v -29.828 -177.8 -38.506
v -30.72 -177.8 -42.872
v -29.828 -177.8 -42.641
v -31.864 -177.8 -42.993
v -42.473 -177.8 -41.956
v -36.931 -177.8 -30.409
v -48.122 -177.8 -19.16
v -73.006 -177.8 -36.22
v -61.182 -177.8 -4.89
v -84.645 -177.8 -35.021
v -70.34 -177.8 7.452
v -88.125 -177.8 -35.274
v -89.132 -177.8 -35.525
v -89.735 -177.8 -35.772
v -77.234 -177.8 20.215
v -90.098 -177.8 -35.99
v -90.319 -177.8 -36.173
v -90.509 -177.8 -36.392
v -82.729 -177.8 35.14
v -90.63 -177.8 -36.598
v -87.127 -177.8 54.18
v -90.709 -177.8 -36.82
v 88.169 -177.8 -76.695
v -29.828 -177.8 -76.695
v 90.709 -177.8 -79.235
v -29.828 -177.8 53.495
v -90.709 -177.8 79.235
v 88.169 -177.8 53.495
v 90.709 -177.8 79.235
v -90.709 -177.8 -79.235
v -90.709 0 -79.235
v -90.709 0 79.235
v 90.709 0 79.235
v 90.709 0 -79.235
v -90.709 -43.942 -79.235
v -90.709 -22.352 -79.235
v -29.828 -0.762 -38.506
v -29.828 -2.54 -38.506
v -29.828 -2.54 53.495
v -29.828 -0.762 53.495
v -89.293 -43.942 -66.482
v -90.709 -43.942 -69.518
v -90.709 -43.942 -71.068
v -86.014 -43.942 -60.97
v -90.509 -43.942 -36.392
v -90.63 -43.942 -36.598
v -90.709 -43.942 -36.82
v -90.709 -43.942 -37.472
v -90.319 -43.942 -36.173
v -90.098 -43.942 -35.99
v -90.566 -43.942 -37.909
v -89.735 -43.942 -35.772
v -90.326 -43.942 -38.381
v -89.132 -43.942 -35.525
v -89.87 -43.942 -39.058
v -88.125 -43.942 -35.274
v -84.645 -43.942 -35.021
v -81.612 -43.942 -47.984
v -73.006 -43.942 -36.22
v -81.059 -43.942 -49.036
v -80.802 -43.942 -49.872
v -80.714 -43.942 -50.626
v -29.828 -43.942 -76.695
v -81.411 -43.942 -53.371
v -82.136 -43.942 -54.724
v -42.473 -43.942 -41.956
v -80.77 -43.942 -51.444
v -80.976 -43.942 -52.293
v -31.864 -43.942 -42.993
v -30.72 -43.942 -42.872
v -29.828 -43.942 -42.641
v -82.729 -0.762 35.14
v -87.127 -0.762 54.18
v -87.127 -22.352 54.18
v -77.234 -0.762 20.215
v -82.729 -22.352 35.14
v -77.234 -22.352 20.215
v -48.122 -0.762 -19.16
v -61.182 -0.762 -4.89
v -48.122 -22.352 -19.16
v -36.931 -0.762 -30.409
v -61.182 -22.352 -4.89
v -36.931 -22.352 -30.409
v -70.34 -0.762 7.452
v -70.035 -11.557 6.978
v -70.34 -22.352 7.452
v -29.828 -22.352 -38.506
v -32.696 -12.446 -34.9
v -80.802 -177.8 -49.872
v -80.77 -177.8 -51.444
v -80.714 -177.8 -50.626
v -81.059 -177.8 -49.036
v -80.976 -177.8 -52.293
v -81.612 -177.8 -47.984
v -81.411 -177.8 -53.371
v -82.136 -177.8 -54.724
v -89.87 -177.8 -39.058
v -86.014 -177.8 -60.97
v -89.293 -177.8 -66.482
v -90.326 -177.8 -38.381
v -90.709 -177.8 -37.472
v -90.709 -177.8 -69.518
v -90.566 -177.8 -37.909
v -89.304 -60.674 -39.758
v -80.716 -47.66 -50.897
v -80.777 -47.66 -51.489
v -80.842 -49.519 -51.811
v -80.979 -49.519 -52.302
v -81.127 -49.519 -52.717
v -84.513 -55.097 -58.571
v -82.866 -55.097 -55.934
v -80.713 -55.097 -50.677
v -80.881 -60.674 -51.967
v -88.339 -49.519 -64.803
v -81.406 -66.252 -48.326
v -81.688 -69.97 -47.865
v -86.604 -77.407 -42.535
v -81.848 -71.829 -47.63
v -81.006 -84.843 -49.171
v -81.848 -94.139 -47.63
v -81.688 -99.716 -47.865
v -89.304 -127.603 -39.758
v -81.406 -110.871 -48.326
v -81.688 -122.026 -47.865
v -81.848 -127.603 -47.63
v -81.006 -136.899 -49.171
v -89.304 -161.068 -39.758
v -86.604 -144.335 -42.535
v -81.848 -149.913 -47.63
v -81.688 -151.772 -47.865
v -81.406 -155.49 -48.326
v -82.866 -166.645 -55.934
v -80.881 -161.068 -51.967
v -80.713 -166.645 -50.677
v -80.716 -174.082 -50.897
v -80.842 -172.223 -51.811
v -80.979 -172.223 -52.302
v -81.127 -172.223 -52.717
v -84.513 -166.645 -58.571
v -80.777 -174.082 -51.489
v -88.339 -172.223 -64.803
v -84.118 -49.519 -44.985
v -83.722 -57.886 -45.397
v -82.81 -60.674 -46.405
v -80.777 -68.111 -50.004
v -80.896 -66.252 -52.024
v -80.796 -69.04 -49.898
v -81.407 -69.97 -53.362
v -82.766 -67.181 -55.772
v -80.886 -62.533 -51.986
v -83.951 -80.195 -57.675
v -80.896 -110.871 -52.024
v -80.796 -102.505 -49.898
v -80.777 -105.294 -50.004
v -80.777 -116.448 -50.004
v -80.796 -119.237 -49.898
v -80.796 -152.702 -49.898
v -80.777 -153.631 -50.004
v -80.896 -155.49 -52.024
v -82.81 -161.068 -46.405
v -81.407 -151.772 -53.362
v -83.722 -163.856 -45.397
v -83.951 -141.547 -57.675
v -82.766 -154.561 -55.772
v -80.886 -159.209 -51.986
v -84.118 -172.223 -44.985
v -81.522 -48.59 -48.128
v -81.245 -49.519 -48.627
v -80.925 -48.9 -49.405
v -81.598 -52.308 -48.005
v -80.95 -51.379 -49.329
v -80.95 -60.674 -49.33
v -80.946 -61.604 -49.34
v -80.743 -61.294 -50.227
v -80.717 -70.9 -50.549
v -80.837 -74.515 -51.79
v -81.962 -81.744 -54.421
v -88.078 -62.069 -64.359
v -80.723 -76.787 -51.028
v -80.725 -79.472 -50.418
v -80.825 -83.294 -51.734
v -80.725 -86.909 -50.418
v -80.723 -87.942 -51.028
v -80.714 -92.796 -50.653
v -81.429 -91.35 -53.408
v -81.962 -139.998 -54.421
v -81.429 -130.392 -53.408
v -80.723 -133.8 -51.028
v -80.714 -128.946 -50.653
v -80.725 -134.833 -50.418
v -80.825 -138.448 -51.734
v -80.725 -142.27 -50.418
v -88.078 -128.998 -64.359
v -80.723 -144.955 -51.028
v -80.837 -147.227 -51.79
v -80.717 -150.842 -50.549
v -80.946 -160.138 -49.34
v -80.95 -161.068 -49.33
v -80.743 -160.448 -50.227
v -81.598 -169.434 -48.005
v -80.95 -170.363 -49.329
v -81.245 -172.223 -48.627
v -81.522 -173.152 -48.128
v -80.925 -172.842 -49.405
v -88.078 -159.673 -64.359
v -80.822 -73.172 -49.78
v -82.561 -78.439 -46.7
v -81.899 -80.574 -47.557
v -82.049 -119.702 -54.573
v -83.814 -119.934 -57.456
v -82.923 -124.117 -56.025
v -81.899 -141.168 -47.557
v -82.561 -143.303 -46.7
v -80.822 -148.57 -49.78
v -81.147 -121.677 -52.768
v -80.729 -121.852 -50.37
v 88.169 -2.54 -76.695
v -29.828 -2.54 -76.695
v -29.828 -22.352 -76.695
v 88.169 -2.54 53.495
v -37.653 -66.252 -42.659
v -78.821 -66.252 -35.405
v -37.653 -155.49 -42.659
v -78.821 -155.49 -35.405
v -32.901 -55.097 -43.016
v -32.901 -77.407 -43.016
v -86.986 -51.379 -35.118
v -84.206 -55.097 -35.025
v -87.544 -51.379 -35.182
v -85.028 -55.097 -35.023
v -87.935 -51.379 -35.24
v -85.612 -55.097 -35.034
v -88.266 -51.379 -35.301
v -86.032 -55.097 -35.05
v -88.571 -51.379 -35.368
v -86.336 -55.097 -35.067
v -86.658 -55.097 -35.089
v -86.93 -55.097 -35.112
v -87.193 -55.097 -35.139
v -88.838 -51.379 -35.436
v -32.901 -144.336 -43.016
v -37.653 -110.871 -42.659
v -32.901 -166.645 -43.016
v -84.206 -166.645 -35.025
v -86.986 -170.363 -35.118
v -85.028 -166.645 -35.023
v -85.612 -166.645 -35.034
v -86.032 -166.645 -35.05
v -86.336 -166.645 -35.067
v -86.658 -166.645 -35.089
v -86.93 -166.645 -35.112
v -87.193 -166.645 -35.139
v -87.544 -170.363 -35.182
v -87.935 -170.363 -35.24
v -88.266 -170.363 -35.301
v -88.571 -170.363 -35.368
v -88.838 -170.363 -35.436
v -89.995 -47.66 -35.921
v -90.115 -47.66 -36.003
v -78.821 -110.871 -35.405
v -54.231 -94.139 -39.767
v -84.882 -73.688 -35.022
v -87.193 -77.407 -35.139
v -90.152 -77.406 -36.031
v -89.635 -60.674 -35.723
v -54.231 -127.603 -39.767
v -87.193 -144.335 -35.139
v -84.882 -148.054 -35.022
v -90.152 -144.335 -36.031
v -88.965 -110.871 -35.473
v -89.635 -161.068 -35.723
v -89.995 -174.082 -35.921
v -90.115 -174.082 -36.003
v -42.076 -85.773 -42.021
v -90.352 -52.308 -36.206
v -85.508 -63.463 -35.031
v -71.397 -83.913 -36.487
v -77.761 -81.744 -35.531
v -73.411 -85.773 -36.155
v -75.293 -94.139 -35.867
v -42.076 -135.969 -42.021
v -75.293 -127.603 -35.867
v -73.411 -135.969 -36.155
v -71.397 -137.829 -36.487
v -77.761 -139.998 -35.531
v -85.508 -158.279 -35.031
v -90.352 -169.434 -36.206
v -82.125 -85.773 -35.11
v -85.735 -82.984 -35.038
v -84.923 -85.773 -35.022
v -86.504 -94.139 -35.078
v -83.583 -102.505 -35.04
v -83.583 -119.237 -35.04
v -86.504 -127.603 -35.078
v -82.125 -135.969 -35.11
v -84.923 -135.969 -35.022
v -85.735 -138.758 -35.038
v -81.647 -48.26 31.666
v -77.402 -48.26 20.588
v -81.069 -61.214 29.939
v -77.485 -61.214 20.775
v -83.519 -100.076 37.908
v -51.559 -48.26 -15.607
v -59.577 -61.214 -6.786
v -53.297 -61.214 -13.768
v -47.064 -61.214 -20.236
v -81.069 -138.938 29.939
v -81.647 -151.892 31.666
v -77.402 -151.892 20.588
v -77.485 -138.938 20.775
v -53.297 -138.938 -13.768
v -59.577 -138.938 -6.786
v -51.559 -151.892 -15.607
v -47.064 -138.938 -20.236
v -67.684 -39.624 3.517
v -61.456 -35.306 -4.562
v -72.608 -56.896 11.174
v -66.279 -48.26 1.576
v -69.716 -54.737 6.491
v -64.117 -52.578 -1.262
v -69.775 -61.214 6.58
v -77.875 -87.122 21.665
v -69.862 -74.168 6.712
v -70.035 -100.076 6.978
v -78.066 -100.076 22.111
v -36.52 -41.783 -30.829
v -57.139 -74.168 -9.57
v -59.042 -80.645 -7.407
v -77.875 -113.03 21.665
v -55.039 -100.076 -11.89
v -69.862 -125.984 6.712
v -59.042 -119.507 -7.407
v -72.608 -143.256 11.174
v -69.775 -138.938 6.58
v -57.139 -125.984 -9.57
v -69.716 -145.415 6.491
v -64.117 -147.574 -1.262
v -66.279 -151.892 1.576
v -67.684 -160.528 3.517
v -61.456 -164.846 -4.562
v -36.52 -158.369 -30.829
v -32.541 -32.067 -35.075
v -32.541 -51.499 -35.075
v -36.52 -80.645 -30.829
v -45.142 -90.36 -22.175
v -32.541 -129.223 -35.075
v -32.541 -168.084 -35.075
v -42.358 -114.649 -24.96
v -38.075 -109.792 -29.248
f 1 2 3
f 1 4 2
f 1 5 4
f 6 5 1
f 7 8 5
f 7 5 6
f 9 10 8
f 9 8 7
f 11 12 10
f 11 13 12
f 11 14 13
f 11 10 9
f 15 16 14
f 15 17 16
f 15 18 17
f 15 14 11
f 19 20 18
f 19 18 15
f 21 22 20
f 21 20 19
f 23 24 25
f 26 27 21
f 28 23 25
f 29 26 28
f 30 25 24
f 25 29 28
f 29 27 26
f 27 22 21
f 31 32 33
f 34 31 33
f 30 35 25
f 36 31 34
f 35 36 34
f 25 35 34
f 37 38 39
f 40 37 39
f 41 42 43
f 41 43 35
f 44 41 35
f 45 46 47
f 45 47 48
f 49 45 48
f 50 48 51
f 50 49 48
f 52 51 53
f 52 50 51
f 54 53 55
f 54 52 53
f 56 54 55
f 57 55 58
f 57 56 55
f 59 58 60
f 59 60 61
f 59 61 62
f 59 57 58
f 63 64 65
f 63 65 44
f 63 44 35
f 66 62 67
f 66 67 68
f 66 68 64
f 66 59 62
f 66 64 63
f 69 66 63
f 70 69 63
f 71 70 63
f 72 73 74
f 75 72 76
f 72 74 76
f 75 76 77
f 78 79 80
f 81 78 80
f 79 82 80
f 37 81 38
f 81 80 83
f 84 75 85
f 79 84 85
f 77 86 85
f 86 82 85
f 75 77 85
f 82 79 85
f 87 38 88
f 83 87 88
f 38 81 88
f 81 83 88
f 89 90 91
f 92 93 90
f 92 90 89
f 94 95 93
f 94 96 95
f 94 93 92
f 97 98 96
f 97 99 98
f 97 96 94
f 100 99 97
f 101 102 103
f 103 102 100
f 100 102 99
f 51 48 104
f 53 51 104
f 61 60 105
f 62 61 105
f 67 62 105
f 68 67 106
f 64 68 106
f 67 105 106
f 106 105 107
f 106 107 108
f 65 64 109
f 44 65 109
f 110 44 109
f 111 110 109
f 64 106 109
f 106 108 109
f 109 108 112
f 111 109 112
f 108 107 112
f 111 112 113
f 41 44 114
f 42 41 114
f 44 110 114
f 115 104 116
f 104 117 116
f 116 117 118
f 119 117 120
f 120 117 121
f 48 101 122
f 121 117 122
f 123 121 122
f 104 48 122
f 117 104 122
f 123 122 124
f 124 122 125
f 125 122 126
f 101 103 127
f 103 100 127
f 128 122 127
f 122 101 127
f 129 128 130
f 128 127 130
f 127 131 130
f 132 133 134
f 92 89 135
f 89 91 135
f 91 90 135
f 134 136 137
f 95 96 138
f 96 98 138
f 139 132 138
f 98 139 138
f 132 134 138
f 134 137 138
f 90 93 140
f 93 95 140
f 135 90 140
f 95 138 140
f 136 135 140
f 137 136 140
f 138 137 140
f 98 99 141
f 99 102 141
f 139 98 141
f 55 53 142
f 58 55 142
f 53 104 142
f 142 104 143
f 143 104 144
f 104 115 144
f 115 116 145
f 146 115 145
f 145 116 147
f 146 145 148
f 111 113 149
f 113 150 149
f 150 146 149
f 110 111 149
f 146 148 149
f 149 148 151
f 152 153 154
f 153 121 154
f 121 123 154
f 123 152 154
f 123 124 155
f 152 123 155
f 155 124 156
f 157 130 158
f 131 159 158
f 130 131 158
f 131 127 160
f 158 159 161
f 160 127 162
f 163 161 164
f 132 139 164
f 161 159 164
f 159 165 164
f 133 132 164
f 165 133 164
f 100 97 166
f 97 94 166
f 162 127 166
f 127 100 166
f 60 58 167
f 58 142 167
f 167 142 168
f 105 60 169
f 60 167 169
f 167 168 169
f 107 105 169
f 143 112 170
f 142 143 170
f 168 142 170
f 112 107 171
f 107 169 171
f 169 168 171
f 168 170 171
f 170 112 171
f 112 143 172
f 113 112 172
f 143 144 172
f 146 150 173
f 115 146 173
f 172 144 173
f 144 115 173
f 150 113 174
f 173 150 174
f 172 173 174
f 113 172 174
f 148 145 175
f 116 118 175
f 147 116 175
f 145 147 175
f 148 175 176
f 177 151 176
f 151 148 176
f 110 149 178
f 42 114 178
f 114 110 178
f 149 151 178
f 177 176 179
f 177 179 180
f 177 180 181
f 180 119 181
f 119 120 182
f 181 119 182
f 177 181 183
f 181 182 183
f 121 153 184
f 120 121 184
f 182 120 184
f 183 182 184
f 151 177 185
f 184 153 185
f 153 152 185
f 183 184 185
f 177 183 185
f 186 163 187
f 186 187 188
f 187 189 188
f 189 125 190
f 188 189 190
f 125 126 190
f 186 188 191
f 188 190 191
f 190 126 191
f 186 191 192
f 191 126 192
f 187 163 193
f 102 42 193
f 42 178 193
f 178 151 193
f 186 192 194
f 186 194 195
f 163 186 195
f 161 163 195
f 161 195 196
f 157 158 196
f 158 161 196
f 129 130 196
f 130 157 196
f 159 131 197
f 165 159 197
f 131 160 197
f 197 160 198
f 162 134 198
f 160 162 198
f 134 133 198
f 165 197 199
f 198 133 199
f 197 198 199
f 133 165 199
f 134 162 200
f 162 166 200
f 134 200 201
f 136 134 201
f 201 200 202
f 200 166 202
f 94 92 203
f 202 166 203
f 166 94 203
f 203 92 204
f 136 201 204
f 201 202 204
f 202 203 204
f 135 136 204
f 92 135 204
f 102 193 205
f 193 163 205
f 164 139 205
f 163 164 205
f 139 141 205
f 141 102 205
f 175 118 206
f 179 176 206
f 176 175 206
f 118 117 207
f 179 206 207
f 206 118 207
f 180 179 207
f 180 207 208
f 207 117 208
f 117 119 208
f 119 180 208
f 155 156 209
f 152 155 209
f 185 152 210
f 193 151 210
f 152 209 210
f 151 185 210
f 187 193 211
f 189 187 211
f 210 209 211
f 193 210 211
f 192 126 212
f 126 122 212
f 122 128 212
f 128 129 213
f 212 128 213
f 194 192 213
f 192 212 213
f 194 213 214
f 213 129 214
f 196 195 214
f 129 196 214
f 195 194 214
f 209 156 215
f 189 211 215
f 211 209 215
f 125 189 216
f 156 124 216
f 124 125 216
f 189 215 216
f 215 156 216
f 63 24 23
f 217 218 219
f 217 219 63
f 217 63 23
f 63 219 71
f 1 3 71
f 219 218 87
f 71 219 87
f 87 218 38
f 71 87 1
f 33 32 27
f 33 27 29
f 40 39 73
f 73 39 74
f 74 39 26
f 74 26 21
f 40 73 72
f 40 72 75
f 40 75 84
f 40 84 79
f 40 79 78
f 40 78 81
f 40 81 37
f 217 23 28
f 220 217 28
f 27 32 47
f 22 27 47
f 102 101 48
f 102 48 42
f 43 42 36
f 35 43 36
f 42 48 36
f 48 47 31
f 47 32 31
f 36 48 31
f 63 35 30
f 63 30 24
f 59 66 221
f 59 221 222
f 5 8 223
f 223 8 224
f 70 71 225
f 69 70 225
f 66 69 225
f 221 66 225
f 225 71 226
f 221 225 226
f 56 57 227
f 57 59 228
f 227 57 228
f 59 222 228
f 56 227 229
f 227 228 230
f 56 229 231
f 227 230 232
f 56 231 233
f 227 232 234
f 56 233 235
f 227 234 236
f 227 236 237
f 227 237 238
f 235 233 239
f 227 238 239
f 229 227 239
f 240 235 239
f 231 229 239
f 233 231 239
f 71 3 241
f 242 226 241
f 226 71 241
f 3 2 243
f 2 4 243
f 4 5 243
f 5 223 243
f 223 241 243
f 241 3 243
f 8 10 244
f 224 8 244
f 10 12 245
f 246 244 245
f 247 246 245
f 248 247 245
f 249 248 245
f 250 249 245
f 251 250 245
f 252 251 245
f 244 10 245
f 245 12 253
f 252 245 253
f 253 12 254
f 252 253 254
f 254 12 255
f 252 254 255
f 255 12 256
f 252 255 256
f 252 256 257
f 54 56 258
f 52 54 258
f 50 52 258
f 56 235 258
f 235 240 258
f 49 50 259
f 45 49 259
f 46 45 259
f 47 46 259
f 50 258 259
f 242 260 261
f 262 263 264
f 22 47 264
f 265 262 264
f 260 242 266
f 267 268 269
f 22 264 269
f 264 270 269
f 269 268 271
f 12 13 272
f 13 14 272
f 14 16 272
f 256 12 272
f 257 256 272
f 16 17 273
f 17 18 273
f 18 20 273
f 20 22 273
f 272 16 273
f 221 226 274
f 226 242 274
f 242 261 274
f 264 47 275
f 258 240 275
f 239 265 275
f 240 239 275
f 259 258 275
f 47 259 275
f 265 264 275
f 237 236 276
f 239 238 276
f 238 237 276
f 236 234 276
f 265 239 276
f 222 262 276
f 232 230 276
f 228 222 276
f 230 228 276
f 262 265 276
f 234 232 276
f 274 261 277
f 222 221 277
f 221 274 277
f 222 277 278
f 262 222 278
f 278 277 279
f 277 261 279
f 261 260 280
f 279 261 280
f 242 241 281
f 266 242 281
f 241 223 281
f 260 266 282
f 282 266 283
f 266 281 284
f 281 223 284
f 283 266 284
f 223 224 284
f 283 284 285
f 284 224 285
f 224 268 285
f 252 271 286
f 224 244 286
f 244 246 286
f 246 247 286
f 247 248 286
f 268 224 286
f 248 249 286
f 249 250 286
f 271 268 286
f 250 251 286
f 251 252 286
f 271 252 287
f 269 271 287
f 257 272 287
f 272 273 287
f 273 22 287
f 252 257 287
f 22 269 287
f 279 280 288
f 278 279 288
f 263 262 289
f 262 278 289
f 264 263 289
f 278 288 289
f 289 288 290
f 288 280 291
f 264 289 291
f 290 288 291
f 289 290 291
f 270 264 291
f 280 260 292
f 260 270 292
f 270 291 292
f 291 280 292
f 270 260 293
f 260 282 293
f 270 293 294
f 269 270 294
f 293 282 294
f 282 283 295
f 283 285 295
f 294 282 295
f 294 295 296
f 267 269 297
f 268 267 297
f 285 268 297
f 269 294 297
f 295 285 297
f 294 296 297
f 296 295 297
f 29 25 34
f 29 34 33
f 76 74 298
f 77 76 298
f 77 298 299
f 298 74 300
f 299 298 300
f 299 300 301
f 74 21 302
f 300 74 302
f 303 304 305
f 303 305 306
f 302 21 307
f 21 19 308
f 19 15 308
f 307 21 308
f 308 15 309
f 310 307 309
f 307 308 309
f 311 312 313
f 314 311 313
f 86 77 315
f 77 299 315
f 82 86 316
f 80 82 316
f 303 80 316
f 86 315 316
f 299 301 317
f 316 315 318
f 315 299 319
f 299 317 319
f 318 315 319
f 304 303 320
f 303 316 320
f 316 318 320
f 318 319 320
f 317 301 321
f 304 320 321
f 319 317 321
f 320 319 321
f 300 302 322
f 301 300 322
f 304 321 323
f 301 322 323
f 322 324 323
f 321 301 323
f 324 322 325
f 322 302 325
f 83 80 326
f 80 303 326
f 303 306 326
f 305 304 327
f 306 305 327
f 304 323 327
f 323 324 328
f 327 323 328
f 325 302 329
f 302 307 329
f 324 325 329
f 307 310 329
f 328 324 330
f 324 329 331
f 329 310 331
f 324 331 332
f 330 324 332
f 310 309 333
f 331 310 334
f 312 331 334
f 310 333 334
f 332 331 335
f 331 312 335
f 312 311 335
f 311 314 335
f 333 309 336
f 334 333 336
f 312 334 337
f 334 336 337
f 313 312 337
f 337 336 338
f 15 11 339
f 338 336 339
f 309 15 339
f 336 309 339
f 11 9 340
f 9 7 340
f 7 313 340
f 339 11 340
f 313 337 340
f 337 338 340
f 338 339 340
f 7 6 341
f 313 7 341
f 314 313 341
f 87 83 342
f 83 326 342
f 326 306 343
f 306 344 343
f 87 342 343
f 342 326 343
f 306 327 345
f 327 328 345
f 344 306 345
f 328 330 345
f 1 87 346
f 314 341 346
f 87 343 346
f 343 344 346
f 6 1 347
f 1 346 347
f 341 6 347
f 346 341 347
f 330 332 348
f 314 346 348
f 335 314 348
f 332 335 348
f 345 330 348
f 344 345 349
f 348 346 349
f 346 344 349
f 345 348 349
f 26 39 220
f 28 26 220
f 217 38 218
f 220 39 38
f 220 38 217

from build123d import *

# Parameters (mm, degrees)
F0_W      = 181.4180165529
F0_H      = 158.4694236517
F1_DEPTH  = 177.8
F2_T      = -2.54
F3_W      = 58.3408249235
F3_H      = 153.3894236517
F4_DEPTH  = 175.26
F5_W      = 117.9971916294
F5_H      = 23.1996511734
F6_DEPTH  = 175.26
F8_DEPTH  = 155.448
F9_DEPTH  = 21.59
F10_DEPTH = 21.59


with BuildPart() as f1:
    # F0 (on Front) → F1 (new body)
    with BuildSketch(Plane.XZ):
        Rectangle(F0_W, F0_H)
    extrude(amount=F1_DEPTH)

    # F2
    f2_openings = [f1.faces().sort_by_distance(p)[0] for p in [
        (0, -177.8, 0),
    ]]
    offset(amount=F2_T, openings=f2_openings)

    # F3 (on face) → F4 (join)
    with BuildSketch(Plane.XZ.offset(2.54)):
        with Locations((-58.9985958147, 0)):
            Rectangle(F3_W, F3_H)
    extrude(amount=F4_DEPTH)

    # F5 (on face) → F6 (join)
    with BuildSketch(Plane.XZ.offset(2.54)):
        with Locations((29.1704124618, 65.0948862392)):
            Rectangle(F5_W, F5_H)
    extrude(amount=F6_DEPTH)

    # F7 (on face) → F8 (cut)
    with BuildSketch(Plane.XZ.offset(177.8)):
        with BuildLine():
            Line((-29.8281833529, 53.4950606525), (-87.1266858607, 54.1800689548))
            add(Edge.make_bspline(
                [(-87.1266858607, 54.1800689548), (-84.1960310539, 37.7339910826), (-73.3918905439, 0.0733245961), (-35.1075253937, -30.5161568282), (-29.8281833529, -38.5061018169)],
                knots=[0.0711804972, 0.0711804972, 0.0711804972, 0.0711804972, 0.2125760889, 0.4036272484, 0.4036272484, 0.4036272484, 0.4036272484], degree=3))
            Line((-29.8281833529, -38.5061018169), (-29.8281833529, 53.4950606525))
        make_face()
        with BuildLine():
            Line((-29.8281833529, -76.6947118258), (-29.8281833529, -42.6409877837))
            add(Edge.make_bspline(
                [(-29.8281833529, -42.6409877837), (-35.4231693122, -44.7782083287), (-76.9735240129, -33.3987697863), (-96.3430681195, -35.7142988828), (-78.4077125974, -48.2869849637), (-82.5900483234, -55.7535374326), (-91.3199582214, -69.1015545227), (-90.8273371486, -70.6873939206), (-90.7090082765, -71.0683166981)],
                knots=[0.4534884255, 0.4534884255, 0.4534884255, 0.4534884255, 0.6260487265, 0.7112245832, 0.8039358777, 0.872883826, 0.969466362, 1, 1, 1, 1], degree=3))
            Line((-90.7090082765, -71.0683166981), (-90.7090082765, -79.2347118258))
            Line((-90.7090082765, -79.2347118258), (-29.8281833529, -76.6947118258))
        make_face()
        with BuildLine():
            add(Edge.make_bspline(
                [(-29.8281833529, -38.5061018169), (-28.4503628307, -40.5913446544), (-28.2115161111, -42.0234394165), (-29.8281833529, -42.6409877837)],
                knots=[0.4036272484, 0.4036272484, 0.4036272484, 0.4036272484, 0.4534884255, 0.4534884255, 0.4534884255, 0.4534884255], degree=3))
            Line((-29.8281833529, -38.5061018169), (-29.8281833529, -42.6409877837))
        make_face()
    extrude(amount=-F8_DEPTH, mode=Mode.SUBTRACT)

    # F9 (cut): a face of the model
    f9_faces = [f1.faces().sort_by_distance(p)[0] for p in [
        (-52.0616522206, -22.352, 20.2283924947),
    ]]
    extrude(f9_faces, amount=-F9_DEPTH, mode=Mode.SUBTRACT)

    # F10 (add): a face of the model
    f10_faces = [f1.faces().sort_by_distance(p)[0] for p in [
        (-59.9035044094, -22.352, -58.7218342299),
    ]]
    extrude(f10_faces, amount=F10_DEPTH)


solid = f1.part
